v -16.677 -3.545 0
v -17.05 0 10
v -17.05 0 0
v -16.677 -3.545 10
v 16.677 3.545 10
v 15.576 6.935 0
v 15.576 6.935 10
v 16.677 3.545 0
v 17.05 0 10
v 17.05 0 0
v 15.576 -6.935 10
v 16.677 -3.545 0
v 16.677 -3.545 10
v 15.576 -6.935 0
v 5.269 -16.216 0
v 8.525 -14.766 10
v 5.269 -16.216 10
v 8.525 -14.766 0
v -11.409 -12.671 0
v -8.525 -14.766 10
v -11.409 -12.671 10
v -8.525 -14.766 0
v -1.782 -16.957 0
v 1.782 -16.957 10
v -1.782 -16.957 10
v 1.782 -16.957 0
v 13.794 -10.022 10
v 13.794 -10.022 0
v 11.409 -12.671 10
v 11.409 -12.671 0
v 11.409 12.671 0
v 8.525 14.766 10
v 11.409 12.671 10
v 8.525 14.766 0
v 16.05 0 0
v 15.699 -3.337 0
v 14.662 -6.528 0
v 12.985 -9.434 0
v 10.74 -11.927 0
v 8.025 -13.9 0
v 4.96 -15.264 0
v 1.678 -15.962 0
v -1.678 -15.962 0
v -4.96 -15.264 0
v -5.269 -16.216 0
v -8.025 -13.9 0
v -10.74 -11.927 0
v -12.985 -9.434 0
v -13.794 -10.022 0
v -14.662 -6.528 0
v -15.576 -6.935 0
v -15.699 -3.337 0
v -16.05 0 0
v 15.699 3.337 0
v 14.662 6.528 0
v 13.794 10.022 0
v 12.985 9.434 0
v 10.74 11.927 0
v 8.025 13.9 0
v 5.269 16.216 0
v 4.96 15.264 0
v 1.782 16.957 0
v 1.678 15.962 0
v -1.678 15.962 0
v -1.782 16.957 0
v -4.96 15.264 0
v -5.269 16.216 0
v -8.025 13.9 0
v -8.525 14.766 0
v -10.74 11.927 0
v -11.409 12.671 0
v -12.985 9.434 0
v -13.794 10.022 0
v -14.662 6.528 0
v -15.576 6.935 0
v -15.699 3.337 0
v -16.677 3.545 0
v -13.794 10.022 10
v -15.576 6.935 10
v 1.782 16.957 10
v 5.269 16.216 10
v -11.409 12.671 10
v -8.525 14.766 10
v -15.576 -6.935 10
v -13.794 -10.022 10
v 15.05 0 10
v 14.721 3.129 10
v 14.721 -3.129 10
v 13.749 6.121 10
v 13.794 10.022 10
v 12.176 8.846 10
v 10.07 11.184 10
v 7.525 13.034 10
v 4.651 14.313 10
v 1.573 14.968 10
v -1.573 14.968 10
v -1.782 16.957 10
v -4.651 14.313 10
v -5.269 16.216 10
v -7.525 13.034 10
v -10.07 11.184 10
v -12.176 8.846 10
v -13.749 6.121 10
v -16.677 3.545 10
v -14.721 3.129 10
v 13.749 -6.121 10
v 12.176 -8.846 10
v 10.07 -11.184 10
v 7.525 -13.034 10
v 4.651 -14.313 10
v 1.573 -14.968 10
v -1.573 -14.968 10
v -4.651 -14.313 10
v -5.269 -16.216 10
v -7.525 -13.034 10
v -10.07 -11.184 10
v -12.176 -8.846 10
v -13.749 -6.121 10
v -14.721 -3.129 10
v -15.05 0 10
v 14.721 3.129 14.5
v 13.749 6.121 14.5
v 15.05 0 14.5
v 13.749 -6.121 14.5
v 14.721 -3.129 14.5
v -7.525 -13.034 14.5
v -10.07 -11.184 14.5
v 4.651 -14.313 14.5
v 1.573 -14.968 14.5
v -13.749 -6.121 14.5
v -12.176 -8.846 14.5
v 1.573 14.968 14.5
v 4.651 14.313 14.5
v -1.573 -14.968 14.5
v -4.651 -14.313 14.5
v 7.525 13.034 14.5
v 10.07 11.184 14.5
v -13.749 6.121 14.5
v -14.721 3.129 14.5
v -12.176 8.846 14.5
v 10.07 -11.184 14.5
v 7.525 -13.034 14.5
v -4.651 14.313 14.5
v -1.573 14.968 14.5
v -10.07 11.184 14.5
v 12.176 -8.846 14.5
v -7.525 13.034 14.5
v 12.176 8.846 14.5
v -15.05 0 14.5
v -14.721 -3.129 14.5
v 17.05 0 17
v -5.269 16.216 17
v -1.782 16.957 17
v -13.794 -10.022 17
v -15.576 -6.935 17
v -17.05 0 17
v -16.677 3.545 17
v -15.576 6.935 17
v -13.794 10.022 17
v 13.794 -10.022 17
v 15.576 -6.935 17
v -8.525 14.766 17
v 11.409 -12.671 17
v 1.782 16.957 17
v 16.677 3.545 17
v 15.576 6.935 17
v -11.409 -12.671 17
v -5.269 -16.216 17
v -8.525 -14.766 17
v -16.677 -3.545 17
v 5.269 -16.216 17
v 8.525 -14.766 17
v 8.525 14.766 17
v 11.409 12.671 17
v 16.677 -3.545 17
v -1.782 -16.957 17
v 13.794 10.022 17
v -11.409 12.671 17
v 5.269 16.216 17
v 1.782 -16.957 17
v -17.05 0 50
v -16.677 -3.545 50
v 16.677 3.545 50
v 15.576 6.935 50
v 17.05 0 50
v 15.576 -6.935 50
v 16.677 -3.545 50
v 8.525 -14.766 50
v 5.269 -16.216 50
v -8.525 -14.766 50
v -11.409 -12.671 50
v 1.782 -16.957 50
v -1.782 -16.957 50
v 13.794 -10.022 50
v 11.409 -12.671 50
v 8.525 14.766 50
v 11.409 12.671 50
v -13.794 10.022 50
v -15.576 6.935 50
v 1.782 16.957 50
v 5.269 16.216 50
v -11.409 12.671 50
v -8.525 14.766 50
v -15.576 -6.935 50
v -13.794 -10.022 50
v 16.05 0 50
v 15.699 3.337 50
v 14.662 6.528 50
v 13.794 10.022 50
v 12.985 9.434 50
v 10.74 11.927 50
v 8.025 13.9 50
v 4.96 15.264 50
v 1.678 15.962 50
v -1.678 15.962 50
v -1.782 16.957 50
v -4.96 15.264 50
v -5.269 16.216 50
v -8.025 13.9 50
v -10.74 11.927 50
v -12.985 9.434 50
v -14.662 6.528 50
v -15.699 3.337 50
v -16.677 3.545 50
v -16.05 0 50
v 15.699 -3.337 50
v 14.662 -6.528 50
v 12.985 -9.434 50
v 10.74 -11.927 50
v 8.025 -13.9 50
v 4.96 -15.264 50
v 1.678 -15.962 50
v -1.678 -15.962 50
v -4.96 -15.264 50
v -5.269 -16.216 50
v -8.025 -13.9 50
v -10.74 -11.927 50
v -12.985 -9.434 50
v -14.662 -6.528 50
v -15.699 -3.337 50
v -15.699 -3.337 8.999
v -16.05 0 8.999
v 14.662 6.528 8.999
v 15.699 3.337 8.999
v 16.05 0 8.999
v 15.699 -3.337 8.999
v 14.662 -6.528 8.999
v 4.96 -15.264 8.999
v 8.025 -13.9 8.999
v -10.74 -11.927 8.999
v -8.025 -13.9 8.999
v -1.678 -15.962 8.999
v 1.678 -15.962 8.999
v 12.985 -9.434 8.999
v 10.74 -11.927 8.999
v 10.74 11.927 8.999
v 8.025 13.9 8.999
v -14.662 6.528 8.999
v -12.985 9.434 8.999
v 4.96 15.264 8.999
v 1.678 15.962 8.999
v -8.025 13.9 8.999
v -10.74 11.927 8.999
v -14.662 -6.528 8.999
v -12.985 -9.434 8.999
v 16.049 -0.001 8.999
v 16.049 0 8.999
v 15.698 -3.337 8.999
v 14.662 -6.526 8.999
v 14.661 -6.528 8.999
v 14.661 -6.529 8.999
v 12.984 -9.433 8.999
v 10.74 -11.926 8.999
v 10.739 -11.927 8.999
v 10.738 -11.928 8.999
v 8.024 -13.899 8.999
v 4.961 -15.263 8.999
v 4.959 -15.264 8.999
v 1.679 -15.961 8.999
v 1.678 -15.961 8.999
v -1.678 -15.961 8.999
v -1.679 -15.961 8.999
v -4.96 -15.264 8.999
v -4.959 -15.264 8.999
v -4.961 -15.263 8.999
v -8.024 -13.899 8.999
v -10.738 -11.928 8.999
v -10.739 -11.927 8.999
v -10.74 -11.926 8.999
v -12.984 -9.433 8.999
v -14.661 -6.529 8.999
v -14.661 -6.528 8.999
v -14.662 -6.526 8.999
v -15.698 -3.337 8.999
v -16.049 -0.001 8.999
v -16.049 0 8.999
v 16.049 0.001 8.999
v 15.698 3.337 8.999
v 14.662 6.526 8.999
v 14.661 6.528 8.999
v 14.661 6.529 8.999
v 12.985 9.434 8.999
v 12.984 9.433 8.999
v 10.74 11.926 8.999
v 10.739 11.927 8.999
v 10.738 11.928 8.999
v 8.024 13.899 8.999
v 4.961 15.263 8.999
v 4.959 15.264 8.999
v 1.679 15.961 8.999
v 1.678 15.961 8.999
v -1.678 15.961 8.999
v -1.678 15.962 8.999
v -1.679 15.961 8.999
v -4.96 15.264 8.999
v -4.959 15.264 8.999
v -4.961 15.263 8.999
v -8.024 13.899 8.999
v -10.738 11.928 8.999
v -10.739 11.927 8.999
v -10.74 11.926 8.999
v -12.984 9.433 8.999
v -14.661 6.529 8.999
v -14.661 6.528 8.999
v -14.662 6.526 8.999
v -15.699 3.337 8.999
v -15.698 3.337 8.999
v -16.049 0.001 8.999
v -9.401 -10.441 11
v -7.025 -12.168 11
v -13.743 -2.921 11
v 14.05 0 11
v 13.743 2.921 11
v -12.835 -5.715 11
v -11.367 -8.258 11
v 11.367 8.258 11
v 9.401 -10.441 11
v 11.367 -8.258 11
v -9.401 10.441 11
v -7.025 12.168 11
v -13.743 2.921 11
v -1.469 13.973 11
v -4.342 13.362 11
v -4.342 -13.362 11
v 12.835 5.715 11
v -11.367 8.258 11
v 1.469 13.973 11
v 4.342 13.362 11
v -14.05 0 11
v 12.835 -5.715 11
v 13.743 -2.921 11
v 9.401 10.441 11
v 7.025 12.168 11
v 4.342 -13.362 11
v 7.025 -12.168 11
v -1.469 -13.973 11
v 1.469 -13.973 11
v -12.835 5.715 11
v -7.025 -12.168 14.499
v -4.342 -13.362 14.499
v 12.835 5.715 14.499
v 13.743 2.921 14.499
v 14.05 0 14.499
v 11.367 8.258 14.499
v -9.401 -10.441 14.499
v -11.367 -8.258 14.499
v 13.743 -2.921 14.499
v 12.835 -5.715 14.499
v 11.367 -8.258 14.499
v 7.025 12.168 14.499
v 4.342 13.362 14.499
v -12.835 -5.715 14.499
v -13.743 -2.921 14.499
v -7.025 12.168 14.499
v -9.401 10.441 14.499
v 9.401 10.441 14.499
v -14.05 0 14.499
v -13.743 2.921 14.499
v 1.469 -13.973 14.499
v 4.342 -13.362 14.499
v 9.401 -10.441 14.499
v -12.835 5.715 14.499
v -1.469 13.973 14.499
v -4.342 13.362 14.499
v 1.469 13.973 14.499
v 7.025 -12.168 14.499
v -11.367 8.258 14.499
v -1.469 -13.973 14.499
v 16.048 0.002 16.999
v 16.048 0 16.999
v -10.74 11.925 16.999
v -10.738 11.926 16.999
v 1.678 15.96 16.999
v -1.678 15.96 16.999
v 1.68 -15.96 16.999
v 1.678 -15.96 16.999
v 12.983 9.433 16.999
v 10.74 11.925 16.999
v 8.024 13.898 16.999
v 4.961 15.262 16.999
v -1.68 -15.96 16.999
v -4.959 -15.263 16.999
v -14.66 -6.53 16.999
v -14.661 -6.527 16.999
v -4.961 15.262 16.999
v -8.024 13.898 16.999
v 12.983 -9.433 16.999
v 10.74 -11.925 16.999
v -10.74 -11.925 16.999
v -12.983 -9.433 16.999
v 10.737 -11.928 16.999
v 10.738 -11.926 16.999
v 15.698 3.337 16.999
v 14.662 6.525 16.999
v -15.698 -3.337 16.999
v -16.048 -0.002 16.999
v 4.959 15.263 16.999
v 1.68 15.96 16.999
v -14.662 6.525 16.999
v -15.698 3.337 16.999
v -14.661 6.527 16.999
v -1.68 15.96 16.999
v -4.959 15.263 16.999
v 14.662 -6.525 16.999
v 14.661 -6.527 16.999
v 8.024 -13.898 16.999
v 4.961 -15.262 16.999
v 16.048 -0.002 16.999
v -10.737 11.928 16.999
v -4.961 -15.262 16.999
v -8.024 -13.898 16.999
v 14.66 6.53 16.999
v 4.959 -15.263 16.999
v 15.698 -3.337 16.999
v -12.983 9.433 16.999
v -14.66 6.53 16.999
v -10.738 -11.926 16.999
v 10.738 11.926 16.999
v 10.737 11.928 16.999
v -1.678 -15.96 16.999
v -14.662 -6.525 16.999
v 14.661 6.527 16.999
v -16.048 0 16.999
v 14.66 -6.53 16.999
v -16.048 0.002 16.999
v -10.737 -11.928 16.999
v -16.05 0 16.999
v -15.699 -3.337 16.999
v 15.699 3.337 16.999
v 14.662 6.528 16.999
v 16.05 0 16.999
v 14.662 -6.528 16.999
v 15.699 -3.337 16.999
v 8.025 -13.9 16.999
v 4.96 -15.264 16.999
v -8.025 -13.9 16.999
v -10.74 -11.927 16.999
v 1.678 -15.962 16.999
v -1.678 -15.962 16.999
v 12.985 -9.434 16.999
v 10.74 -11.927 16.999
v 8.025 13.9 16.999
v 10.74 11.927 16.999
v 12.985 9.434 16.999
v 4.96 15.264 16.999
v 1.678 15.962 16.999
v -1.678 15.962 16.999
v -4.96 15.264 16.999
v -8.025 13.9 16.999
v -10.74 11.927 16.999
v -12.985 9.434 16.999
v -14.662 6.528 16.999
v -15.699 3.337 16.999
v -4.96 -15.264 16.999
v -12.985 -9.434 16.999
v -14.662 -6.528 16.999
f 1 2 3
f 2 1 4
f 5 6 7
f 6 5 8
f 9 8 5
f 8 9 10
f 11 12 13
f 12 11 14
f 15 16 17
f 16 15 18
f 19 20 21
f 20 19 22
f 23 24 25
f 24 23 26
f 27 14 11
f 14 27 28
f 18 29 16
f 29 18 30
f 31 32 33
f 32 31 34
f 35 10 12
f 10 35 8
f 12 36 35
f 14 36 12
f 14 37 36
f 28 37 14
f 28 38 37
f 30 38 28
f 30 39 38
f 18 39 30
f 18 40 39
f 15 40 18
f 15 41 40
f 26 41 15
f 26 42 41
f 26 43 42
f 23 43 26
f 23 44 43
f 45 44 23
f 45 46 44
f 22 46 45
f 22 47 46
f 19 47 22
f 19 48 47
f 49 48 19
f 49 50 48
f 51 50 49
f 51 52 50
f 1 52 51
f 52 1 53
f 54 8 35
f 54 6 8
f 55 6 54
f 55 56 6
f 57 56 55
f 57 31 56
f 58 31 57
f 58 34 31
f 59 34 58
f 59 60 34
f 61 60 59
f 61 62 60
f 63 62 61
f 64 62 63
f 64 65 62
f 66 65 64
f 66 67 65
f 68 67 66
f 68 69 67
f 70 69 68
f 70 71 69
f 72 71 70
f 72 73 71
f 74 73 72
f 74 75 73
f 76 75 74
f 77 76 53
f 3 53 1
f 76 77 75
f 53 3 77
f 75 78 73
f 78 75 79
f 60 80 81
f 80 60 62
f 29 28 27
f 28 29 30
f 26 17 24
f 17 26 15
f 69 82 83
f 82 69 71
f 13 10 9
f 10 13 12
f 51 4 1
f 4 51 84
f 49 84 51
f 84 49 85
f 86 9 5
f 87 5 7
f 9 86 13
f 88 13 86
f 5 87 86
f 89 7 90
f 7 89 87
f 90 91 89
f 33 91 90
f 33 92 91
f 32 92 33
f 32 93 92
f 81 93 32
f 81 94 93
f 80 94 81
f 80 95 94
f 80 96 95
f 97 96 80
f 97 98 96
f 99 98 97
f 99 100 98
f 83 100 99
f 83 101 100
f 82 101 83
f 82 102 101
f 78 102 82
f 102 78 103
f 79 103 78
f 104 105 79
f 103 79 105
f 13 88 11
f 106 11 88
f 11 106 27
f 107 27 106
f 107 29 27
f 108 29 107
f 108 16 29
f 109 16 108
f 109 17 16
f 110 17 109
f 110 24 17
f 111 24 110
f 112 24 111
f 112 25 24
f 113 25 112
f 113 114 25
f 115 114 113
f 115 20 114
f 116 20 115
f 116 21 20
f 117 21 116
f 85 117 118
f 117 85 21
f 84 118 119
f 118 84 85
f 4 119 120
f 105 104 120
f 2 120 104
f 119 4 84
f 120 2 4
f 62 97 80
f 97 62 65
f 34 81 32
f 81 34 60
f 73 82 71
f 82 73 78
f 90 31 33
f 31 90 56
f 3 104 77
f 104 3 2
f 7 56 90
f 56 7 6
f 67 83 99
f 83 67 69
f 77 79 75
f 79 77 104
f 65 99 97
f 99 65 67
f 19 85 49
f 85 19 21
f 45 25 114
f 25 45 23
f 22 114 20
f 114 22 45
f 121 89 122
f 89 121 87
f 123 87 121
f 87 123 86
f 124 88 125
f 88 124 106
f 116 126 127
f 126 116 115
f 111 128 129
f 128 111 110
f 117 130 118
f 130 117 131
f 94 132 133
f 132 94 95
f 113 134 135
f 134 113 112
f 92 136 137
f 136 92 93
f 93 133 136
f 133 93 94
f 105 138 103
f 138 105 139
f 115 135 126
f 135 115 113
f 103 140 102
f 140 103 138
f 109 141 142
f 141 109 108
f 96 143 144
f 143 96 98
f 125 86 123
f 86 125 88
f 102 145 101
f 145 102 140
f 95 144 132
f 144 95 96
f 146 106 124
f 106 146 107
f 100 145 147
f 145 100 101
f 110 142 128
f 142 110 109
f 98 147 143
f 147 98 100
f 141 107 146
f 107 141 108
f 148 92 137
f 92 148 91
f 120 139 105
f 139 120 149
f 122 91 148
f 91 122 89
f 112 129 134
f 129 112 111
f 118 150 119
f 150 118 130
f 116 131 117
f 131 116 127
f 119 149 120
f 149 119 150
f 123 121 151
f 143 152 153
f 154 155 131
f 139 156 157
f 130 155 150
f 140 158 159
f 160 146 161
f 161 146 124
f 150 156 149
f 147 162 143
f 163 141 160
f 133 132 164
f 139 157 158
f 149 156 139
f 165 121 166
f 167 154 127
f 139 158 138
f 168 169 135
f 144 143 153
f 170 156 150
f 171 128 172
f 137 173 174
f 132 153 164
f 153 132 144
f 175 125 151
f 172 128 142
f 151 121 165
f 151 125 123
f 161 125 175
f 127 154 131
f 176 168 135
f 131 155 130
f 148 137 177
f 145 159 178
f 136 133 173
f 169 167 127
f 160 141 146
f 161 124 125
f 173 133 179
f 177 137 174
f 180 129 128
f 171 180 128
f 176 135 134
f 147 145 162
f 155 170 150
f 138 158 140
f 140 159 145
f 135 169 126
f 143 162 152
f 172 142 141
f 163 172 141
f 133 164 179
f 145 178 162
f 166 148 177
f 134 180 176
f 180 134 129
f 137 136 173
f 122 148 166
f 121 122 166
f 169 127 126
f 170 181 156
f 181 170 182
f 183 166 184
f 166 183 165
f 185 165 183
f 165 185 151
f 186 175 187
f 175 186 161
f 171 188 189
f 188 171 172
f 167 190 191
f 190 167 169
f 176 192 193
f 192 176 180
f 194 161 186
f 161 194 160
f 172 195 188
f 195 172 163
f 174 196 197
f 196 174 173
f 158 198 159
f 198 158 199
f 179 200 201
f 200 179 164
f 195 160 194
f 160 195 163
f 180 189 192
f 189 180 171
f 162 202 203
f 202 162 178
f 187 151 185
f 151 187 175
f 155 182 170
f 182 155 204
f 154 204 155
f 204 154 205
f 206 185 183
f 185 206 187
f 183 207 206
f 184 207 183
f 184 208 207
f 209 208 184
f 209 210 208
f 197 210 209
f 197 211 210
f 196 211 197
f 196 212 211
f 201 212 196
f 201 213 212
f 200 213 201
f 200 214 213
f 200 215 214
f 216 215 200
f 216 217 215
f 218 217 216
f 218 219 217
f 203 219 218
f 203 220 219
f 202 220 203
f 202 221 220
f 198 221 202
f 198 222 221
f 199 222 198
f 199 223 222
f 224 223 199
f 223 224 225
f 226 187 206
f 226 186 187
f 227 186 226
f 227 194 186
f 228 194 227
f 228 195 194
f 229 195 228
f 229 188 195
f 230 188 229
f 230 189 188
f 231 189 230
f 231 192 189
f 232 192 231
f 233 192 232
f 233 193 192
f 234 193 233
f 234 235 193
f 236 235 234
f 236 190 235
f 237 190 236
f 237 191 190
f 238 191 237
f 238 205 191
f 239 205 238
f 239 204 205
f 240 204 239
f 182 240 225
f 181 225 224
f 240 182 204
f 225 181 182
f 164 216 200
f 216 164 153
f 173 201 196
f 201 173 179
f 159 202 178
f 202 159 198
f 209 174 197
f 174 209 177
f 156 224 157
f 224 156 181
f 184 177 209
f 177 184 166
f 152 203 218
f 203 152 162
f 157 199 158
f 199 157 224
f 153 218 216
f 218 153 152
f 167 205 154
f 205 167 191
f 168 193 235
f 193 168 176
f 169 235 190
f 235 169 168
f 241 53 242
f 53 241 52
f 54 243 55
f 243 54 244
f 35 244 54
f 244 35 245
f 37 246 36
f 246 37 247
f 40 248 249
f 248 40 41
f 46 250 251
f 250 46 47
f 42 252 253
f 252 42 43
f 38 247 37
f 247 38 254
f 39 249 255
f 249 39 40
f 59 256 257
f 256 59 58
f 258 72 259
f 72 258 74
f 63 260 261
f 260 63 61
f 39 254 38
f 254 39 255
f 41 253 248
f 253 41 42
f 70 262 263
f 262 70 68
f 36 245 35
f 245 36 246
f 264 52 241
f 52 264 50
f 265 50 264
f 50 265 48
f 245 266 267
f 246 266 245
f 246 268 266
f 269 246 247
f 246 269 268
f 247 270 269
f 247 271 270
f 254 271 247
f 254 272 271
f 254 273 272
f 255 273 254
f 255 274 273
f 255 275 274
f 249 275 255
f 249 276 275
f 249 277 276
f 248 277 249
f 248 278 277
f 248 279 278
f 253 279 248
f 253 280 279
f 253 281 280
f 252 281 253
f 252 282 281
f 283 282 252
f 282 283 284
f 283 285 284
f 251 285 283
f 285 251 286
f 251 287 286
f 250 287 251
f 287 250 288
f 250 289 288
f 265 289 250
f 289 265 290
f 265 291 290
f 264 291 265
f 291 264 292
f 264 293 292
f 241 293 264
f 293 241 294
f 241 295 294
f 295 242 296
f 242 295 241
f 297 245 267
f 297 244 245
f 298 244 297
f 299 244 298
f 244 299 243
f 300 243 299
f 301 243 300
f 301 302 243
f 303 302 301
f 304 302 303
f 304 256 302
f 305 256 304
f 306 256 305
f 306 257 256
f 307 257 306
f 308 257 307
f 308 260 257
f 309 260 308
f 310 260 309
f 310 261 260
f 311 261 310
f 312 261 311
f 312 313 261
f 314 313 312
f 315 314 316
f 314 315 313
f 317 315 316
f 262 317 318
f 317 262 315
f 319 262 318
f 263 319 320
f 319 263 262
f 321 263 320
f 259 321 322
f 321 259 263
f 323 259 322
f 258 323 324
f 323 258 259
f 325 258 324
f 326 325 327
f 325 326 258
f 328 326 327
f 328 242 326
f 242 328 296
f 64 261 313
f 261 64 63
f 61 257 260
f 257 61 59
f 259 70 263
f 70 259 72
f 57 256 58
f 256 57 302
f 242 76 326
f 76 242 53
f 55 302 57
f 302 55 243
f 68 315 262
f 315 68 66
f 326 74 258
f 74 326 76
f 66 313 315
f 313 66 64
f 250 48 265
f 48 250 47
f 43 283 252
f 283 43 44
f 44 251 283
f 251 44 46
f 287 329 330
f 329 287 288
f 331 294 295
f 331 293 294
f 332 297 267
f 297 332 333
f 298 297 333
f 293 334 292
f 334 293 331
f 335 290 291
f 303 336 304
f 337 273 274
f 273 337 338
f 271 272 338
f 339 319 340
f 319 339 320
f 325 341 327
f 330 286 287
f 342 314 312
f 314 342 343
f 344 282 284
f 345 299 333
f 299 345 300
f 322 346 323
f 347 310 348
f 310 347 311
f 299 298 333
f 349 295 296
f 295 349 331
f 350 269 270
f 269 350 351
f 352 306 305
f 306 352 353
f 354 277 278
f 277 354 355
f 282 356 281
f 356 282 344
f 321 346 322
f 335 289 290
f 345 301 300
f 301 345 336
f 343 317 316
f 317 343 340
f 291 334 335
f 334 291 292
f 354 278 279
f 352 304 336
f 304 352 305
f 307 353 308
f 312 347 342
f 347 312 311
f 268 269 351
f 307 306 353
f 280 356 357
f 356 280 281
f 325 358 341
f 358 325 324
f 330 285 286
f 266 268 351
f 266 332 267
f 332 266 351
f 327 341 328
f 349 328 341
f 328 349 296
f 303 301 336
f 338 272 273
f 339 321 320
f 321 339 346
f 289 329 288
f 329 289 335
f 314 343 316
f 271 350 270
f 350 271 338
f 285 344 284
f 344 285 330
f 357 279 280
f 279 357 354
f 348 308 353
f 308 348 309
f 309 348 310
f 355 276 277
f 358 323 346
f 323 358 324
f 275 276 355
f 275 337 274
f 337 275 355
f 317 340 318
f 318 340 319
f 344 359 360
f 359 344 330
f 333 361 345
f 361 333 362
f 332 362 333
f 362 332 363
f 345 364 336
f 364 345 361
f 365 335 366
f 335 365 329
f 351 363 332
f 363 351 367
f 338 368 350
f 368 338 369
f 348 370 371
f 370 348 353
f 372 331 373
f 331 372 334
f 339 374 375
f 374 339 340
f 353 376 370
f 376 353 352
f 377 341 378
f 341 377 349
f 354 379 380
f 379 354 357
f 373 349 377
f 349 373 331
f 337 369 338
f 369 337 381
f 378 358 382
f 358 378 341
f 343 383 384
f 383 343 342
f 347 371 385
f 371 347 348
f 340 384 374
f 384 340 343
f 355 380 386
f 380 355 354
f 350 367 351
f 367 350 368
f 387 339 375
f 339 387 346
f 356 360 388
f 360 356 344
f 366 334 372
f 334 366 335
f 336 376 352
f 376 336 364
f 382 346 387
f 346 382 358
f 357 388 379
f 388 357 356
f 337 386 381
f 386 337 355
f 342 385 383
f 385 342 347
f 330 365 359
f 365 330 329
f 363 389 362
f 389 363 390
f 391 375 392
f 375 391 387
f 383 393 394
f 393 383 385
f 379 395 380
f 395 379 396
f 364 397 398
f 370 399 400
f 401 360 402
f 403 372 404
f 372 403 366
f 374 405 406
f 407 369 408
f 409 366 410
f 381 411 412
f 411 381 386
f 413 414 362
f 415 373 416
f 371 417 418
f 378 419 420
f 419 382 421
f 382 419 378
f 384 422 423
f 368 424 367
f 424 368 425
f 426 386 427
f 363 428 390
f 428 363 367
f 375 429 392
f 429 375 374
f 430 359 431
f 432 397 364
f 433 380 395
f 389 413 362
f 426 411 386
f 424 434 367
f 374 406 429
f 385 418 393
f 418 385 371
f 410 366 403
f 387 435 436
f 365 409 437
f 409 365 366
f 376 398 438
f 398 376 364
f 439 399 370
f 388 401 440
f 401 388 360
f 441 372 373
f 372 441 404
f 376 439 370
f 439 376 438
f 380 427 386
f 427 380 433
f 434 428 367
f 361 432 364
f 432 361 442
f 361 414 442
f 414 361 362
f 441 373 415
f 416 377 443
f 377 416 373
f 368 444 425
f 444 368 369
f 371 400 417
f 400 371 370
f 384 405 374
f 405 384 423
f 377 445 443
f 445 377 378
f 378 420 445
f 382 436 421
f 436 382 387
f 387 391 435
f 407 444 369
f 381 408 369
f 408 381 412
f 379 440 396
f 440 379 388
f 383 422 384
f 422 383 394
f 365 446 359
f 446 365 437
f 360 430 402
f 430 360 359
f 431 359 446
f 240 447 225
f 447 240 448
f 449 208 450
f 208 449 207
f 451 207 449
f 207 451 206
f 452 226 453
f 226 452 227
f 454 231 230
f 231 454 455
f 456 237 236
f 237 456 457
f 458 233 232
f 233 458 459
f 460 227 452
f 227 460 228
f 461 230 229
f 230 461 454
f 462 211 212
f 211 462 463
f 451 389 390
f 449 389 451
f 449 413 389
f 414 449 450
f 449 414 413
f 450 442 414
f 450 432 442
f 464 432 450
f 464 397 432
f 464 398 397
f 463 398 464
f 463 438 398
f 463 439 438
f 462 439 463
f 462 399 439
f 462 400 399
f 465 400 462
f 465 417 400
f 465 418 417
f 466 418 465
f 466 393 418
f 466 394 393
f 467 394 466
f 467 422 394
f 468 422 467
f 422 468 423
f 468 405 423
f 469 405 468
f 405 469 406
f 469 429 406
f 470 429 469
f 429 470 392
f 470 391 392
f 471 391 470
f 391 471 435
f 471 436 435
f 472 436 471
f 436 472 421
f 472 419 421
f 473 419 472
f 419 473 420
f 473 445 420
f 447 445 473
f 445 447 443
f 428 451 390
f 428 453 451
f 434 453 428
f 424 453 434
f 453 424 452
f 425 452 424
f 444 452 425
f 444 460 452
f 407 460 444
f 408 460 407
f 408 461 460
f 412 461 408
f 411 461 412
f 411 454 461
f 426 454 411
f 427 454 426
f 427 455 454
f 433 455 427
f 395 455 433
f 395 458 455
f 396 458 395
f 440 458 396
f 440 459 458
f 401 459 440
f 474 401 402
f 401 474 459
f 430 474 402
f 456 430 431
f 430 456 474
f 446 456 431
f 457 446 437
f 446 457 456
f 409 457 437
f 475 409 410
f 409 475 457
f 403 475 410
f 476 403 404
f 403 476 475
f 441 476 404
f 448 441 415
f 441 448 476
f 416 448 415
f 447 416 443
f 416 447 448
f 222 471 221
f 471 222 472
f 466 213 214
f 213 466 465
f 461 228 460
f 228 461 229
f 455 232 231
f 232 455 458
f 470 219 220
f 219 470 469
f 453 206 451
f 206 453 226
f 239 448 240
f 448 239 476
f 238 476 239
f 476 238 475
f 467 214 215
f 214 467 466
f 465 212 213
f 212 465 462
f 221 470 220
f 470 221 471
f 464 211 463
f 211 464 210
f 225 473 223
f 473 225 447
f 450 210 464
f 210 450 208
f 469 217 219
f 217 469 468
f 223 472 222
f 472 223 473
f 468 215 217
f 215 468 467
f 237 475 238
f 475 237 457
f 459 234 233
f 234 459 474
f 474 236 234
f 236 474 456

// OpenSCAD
DysonLength = 50;

module DysonConnector(WallThickness = 3, h = 50)
{
    if (WallThickness < 0.5) {
        WallThickness = 0.5;
    }
    if (h < 50) {
        h = 50;
    }
    DysonOD = 34.1;
    DysonOR = DysonOD / 2;
    DysonID = DysonOD - WallThickness * 2;
    DysonIR = DysonID / 2;

    BaseTubeH = 10;
    BaseTubeZ = BaseTubeH;
    LedgeH = 4.5;
    LedgeZ = BaseTubeZ + LedgeH;
    LedgeSlopeH = 2.5;
    LedgeSlopeZ = LedgeZ + LedgeSlopeH;
    LedgeOD = DysonOD - 4;
    LedgeOR = LedgeOD / 2;
    LedgeID = LedgeOD - WallThickness * 2;
    LedgeIR = LedgeID / 2;

    AnchorTubeZ = h;
    AnchorTubeH = AnchorTubeZ - LedgeSlopeZ;

    AnchorBaseZ = 37;
    AnchorTailH = 8;
    AnchorWidth = 19.8;

    // Put a union to put our cylinder and our anchor together
    union() {
        // first the rocket tube
        difference() {
            // first build the outside
            union() {
                cylinder(h=BaseTubeH, r=DysonOR);
                    translate([0,0,BaseTubeZ])
                cylinder(h=LedgeH, r=LedgeOR);
                    translate([0,0,LedgeZ])
                cylinder(h=LedgeSlopeH, r=DysonOR, r1=LedgeOR);
                    translate([0,0,LedgeSlopeZ])
                cylinder(h=AnchorTubeH, r=DysonOR);
            }
            // then remove the inside from it
            translate([0,0,-0.001])
                cylinder(h=BaseTubeH-WallThickness, r=DysonIR);
            translate([0,0,BaseTubeZ - (WallThickness+0.002)])
                cylinder(h=WallThickness*2 + 0.002, r=LedgeIR, r1=DysonIR);
            translate([0,0,BaseTubeZ-0.001])
                cylinder(h=LedgeH + 0.002, r=LedgeIR);
            translate([0,0,LedgeZ-0.001])
                cylinder(h=LedgeSlopeH + 0.002, r=DysonIR, r1=LedgeIR);
            translate([0,0,LedgeSlopeZ-0.001])
                cylinder(h=AnchorTubeH+0.002, r=DysonIR);
        }

    }
}

DysonConnector(1);
